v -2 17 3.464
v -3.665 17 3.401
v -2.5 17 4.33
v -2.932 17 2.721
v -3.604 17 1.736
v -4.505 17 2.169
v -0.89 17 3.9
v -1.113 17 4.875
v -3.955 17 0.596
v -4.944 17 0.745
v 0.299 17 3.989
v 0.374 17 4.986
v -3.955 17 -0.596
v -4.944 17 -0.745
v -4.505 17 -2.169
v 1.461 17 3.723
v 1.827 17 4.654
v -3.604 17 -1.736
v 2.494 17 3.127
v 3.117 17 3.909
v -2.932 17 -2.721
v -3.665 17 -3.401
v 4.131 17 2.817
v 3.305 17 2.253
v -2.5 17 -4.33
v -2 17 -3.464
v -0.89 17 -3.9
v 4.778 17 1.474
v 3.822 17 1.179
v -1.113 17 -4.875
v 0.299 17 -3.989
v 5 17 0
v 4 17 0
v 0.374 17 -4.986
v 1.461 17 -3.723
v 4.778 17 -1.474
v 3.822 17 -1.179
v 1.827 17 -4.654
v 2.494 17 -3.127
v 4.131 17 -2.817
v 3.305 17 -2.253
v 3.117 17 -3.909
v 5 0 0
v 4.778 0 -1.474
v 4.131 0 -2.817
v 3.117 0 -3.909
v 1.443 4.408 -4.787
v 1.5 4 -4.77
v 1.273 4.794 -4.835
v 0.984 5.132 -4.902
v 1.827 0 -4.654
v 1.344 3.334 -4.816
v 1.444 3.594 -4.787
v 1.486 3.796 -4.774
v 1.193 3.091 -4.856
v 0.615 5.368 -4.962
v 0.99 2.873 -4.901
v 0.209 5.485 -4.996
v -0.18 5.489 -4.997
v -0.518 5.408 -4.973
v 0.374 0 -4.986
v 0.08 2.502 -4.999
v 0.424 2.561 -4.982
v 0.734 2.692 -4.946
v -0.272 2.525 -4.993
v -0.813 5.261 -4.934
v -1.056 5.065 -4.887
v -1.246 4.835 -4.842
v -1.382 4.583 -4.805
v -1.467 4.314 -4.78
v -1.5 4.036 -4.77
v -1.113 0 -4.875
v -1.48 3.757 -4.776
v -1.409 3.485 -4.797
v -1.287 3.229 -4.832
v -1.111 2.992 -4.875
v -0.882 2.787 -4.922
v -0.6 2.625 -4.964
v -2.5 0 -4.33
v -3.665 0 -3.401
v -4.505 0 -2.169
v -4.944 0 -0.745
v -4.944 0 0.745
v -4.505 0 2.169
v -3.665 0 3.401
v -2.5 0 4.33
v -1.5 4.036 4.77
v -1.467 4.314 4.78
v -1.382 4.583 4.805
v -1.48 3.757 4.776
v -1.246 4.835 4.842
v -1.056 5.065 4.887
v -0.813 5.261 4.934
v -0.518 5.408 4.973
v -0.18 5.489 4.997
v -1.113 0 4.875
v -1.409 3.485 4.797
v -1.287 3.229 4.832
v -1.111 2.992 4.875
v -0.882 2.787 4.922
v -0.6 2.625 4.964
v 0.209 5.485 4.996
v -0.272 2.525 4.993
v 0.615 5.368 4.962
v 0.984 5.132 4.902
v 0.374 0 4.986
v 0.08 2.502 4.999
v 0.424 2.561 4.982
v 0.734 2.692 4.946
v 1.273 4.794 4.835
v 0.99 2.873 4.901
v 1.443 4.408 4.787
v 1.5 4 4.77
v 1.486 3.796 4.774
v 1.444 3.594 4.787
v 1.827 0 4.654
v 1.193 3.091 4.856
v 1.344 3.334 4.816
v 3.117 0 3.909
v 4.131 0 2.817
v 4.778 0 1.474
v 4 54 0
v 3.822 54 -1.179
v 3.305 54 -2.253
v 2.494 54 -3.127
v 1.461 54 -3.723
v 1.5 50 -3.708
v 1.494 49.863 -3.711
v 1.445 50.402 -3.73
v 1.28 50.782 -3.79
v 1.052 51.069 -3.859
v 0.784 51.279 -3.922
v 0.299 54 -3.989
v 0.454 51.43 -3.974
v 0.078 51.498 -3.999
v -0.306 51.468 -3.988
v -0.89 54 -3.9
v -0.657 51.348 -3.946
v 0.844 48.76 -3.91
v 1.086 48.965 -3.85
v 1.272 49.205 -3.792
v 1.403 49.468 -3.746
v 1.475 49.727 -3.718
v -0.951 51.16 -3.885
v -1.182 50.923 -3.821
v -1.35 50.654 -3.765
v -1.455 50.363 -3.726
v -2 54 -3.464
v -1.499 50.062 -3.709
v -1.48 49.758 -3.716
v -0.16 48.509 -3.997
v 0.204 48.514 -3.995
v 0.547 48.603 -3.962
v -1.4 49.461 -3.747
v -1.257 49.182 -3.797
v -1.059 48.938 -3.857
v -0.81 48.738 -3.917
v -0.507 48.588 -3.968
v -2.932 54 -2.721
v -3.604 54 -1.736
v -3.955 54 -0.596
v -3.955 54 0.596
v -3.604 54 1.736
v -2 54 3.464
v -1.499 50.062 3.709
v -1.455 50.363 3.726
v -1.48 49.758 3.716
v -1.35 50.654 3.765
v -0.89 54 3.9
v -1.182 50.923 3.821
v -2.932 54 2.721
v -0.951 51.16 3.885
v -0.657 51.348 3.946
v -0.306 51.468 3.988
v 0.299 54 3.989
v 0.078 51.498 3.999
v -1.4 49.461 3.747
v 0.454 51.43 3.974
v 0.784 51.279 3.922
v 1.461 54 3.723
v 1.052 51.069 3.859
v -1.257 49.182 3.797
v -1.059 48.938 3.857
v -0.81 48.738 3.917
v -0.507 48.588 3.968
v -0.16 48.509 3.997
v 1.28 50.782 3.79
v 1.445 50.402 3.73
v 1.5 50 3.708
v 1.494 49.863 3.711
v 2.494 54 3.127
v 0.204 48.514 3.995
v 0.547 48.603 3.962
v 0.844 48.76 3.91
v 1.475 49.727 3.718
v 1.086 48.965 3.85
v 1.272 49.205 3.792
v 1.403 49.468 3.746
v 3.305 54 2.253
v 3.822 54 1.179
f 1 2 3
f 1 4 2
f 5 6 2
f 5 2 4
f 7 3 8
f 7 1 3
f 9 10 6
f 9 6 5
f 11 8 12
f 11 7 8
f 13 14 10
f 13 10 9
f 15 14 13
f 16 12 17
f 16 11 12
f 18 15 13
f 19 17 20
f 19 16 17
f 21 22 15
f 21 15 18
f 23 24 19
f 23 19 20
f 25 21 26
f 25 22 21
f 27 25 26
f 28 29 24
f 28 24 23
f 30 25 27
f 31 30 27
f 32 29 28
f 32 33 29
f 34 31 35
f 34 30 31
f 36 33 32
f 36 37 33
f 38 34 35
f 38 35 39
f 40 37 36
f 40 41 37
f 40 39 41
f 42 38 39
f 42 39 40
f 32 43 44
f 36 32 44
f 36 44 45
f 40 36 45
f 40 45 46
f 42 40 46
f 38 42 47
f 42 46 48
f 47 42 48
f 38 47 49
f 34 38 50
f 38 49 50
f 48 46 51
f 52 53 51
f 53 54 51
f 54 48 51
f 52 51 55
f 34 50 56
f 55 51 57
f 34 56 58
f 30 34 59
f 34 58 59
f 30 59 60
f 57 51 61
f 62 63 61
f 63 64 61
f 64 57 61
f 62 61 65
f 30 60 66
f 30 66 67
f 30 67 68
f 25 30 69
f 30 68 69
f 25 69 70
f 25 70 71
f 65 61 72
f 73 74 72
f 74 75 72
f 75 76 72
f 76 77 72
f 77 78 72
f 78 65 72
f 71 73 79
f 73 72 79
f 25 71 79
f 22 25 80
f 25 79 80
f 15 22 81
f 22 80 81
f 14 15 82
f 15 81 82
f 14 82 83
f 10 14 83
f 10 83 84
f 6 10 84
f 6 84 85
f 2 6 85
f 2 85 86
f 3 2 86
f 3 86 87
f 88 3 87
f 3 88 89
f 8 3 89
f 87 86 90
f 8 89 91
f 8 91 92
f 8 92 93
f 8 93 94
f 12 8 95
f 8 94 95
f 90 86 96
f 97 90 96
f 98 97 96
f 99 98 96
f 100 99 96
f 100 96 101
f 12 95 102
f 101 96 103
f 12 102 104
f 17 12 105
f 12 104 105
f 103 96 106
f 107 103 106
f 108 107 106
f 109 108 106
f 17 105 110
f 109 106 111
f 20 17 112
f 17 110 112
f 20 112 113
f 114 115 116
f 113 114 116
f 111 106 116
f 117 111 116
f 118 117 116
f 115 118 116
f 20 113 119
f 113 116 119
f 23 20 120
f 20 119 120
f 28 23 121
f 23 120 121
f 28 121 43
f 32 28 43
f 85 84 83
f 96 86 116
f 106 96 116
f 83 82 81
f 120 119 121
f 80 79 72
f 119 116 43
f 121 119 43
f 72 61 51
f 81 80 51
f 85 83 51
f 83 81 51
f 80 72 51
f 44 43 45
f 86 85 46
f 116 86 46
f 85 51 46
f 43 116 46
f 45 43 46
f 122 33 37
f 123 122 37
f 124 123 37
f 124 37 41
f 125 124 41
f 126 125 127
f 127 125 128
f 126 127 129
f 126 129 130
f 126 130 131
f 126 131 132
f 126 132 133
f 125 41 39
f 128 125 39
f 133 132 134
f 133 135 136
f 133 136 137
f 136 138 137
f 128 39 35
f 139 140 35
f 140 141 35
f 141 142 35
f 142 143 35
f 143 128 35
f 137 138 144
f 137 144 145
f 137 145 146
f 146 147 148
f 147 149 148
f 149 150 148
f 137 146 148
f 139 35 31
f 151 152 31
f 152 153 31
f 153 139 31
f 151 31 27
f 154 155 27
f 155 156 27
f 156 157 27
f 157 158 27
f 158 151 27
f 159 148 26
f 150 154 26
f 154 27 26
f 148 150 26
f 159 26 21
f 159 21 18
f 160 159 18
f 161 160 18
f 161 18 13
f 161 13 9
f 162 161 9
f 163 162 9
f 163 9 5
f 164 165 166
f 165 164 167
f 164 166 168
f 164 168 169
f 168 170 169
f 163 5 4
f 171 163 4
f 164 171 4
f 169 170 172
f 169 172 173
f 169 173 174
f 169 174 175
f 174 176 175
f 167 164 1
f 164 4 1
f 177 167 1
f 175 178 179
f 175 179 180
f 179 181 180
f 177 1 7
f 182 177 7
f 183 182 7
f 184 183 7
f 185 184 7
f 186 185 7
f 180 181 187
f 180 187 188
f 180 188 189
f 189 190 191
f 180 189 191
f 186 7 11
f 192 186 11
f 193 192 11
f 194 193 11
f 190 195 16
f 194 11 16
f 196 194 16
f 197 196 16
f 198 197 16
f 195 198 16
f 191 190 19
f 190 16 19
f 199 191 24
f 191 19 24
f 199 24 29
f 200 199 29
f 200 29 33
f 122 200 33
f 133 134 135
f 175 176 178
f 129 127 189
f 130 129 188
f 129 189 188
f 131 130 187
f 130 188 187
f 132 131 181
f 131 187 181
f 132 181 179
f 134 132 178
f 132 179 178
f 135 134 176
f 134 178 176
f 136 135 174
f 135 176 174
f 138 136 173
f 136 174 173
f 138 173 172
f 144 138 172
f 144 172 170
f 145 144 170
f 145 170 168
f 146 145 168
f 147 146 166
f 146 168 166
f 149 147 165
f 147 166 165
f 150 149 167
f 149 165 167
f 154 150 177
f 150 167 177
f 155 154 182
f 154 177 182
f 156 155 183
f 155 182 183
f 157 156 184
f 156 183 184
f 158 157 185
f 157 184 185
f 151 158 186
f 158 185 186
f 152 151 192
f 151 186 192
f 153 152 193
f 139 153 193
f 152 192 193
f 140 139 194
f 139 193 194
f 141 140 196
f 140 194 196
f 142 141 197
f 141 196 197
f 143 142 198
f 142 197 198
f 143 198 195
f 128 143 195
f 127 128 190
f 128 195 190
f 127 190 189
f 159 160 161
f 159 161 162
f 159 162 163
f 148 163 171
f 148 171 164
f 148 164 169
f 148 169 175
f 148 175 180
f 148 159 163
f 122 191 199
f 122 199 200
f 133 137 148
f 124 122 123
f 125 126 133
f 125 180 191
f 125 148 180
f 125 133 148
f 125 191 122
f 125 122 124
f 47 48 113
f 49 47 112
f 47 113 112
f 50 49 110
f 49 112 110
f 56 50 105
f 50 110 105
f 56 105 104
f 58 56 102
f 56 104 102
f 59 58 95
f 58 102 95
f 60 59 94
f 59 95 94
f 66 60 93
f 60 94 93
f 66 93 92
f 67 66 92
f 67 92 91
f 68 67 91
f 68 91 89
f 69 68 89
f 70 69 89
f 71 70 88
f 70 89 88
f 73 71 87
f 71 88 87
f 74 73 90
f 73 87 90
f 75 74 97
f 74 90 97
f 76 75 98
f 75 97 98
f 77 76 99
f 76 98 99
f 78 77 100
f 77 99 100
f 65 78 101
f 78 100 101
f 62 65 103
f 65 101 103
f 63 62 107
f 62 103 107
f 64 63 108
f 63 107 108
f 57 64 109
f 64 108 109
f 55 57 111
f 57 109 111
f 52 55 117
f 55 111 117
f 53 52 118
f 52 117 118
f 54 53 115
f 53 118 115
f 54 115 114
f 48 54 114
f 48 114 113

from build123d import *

# Parameters (mm, degrees)
SKETCH1_R               = 4
SKETCH1_R_2             = 5
BOSS_EXTRUDE1_DEPTH     = 17
SKETCH1_3_R             = 4
BOSS_EXTRUDE2_DEPTH     = 54
SKETCH2_R               = 1.5
CUT_EXTRUDE1_DEPTH      = 6
CUT_EXTRUDE1_DEPTH_BACK = 6


with BuildPart() as part:
    # Sketch1 → Boss-Extrude1 (new body)
    with BuildSketch(Plane(origin=(0, 0, 0), x_dir=(1, 0, 0), z_dir=(0, 1, 0))):
        Circle(SKETCH1_R)
        Circle(SKETCH1_R_2)
        Circle(SKETCH1_R, mode=Mode.SUBTRACT)
    extrude(amount=BOSS_EXTRUDE1_DEPTH)

    # Sketch1<3> → Boss-Extrude2 (add)
    with BuildSketch(Plane(origin=(0, 0, 0), x_dir=(1, 0, 0), z_dir=(0, 1, 0))):
        Circle(SKETCH1_3_R)
    extrude(amount=BOSS_EXTRUDE2_DEPTH)

    # Sketch2 → Cut-Extrude1 (cut, two sides)
    with BuildSketch(Plane.XY) as cut_extrude1_sk:
        with Locations((0, 50)):
            Circle(SKETCH2_R)
        with Locations((0, 4)):
            Circle(SKETCH2_R)
    extrude(amount=CUT_EXTRUDE1_DEPTH, mode=Mode.SUBTRACT)
    extrude(cut_extrude1_sk.sketch, amount=-CUT_EXTRUDE1_DEPTH_BACK, mode=Mode.SUBTRACT)


solid = part.part
